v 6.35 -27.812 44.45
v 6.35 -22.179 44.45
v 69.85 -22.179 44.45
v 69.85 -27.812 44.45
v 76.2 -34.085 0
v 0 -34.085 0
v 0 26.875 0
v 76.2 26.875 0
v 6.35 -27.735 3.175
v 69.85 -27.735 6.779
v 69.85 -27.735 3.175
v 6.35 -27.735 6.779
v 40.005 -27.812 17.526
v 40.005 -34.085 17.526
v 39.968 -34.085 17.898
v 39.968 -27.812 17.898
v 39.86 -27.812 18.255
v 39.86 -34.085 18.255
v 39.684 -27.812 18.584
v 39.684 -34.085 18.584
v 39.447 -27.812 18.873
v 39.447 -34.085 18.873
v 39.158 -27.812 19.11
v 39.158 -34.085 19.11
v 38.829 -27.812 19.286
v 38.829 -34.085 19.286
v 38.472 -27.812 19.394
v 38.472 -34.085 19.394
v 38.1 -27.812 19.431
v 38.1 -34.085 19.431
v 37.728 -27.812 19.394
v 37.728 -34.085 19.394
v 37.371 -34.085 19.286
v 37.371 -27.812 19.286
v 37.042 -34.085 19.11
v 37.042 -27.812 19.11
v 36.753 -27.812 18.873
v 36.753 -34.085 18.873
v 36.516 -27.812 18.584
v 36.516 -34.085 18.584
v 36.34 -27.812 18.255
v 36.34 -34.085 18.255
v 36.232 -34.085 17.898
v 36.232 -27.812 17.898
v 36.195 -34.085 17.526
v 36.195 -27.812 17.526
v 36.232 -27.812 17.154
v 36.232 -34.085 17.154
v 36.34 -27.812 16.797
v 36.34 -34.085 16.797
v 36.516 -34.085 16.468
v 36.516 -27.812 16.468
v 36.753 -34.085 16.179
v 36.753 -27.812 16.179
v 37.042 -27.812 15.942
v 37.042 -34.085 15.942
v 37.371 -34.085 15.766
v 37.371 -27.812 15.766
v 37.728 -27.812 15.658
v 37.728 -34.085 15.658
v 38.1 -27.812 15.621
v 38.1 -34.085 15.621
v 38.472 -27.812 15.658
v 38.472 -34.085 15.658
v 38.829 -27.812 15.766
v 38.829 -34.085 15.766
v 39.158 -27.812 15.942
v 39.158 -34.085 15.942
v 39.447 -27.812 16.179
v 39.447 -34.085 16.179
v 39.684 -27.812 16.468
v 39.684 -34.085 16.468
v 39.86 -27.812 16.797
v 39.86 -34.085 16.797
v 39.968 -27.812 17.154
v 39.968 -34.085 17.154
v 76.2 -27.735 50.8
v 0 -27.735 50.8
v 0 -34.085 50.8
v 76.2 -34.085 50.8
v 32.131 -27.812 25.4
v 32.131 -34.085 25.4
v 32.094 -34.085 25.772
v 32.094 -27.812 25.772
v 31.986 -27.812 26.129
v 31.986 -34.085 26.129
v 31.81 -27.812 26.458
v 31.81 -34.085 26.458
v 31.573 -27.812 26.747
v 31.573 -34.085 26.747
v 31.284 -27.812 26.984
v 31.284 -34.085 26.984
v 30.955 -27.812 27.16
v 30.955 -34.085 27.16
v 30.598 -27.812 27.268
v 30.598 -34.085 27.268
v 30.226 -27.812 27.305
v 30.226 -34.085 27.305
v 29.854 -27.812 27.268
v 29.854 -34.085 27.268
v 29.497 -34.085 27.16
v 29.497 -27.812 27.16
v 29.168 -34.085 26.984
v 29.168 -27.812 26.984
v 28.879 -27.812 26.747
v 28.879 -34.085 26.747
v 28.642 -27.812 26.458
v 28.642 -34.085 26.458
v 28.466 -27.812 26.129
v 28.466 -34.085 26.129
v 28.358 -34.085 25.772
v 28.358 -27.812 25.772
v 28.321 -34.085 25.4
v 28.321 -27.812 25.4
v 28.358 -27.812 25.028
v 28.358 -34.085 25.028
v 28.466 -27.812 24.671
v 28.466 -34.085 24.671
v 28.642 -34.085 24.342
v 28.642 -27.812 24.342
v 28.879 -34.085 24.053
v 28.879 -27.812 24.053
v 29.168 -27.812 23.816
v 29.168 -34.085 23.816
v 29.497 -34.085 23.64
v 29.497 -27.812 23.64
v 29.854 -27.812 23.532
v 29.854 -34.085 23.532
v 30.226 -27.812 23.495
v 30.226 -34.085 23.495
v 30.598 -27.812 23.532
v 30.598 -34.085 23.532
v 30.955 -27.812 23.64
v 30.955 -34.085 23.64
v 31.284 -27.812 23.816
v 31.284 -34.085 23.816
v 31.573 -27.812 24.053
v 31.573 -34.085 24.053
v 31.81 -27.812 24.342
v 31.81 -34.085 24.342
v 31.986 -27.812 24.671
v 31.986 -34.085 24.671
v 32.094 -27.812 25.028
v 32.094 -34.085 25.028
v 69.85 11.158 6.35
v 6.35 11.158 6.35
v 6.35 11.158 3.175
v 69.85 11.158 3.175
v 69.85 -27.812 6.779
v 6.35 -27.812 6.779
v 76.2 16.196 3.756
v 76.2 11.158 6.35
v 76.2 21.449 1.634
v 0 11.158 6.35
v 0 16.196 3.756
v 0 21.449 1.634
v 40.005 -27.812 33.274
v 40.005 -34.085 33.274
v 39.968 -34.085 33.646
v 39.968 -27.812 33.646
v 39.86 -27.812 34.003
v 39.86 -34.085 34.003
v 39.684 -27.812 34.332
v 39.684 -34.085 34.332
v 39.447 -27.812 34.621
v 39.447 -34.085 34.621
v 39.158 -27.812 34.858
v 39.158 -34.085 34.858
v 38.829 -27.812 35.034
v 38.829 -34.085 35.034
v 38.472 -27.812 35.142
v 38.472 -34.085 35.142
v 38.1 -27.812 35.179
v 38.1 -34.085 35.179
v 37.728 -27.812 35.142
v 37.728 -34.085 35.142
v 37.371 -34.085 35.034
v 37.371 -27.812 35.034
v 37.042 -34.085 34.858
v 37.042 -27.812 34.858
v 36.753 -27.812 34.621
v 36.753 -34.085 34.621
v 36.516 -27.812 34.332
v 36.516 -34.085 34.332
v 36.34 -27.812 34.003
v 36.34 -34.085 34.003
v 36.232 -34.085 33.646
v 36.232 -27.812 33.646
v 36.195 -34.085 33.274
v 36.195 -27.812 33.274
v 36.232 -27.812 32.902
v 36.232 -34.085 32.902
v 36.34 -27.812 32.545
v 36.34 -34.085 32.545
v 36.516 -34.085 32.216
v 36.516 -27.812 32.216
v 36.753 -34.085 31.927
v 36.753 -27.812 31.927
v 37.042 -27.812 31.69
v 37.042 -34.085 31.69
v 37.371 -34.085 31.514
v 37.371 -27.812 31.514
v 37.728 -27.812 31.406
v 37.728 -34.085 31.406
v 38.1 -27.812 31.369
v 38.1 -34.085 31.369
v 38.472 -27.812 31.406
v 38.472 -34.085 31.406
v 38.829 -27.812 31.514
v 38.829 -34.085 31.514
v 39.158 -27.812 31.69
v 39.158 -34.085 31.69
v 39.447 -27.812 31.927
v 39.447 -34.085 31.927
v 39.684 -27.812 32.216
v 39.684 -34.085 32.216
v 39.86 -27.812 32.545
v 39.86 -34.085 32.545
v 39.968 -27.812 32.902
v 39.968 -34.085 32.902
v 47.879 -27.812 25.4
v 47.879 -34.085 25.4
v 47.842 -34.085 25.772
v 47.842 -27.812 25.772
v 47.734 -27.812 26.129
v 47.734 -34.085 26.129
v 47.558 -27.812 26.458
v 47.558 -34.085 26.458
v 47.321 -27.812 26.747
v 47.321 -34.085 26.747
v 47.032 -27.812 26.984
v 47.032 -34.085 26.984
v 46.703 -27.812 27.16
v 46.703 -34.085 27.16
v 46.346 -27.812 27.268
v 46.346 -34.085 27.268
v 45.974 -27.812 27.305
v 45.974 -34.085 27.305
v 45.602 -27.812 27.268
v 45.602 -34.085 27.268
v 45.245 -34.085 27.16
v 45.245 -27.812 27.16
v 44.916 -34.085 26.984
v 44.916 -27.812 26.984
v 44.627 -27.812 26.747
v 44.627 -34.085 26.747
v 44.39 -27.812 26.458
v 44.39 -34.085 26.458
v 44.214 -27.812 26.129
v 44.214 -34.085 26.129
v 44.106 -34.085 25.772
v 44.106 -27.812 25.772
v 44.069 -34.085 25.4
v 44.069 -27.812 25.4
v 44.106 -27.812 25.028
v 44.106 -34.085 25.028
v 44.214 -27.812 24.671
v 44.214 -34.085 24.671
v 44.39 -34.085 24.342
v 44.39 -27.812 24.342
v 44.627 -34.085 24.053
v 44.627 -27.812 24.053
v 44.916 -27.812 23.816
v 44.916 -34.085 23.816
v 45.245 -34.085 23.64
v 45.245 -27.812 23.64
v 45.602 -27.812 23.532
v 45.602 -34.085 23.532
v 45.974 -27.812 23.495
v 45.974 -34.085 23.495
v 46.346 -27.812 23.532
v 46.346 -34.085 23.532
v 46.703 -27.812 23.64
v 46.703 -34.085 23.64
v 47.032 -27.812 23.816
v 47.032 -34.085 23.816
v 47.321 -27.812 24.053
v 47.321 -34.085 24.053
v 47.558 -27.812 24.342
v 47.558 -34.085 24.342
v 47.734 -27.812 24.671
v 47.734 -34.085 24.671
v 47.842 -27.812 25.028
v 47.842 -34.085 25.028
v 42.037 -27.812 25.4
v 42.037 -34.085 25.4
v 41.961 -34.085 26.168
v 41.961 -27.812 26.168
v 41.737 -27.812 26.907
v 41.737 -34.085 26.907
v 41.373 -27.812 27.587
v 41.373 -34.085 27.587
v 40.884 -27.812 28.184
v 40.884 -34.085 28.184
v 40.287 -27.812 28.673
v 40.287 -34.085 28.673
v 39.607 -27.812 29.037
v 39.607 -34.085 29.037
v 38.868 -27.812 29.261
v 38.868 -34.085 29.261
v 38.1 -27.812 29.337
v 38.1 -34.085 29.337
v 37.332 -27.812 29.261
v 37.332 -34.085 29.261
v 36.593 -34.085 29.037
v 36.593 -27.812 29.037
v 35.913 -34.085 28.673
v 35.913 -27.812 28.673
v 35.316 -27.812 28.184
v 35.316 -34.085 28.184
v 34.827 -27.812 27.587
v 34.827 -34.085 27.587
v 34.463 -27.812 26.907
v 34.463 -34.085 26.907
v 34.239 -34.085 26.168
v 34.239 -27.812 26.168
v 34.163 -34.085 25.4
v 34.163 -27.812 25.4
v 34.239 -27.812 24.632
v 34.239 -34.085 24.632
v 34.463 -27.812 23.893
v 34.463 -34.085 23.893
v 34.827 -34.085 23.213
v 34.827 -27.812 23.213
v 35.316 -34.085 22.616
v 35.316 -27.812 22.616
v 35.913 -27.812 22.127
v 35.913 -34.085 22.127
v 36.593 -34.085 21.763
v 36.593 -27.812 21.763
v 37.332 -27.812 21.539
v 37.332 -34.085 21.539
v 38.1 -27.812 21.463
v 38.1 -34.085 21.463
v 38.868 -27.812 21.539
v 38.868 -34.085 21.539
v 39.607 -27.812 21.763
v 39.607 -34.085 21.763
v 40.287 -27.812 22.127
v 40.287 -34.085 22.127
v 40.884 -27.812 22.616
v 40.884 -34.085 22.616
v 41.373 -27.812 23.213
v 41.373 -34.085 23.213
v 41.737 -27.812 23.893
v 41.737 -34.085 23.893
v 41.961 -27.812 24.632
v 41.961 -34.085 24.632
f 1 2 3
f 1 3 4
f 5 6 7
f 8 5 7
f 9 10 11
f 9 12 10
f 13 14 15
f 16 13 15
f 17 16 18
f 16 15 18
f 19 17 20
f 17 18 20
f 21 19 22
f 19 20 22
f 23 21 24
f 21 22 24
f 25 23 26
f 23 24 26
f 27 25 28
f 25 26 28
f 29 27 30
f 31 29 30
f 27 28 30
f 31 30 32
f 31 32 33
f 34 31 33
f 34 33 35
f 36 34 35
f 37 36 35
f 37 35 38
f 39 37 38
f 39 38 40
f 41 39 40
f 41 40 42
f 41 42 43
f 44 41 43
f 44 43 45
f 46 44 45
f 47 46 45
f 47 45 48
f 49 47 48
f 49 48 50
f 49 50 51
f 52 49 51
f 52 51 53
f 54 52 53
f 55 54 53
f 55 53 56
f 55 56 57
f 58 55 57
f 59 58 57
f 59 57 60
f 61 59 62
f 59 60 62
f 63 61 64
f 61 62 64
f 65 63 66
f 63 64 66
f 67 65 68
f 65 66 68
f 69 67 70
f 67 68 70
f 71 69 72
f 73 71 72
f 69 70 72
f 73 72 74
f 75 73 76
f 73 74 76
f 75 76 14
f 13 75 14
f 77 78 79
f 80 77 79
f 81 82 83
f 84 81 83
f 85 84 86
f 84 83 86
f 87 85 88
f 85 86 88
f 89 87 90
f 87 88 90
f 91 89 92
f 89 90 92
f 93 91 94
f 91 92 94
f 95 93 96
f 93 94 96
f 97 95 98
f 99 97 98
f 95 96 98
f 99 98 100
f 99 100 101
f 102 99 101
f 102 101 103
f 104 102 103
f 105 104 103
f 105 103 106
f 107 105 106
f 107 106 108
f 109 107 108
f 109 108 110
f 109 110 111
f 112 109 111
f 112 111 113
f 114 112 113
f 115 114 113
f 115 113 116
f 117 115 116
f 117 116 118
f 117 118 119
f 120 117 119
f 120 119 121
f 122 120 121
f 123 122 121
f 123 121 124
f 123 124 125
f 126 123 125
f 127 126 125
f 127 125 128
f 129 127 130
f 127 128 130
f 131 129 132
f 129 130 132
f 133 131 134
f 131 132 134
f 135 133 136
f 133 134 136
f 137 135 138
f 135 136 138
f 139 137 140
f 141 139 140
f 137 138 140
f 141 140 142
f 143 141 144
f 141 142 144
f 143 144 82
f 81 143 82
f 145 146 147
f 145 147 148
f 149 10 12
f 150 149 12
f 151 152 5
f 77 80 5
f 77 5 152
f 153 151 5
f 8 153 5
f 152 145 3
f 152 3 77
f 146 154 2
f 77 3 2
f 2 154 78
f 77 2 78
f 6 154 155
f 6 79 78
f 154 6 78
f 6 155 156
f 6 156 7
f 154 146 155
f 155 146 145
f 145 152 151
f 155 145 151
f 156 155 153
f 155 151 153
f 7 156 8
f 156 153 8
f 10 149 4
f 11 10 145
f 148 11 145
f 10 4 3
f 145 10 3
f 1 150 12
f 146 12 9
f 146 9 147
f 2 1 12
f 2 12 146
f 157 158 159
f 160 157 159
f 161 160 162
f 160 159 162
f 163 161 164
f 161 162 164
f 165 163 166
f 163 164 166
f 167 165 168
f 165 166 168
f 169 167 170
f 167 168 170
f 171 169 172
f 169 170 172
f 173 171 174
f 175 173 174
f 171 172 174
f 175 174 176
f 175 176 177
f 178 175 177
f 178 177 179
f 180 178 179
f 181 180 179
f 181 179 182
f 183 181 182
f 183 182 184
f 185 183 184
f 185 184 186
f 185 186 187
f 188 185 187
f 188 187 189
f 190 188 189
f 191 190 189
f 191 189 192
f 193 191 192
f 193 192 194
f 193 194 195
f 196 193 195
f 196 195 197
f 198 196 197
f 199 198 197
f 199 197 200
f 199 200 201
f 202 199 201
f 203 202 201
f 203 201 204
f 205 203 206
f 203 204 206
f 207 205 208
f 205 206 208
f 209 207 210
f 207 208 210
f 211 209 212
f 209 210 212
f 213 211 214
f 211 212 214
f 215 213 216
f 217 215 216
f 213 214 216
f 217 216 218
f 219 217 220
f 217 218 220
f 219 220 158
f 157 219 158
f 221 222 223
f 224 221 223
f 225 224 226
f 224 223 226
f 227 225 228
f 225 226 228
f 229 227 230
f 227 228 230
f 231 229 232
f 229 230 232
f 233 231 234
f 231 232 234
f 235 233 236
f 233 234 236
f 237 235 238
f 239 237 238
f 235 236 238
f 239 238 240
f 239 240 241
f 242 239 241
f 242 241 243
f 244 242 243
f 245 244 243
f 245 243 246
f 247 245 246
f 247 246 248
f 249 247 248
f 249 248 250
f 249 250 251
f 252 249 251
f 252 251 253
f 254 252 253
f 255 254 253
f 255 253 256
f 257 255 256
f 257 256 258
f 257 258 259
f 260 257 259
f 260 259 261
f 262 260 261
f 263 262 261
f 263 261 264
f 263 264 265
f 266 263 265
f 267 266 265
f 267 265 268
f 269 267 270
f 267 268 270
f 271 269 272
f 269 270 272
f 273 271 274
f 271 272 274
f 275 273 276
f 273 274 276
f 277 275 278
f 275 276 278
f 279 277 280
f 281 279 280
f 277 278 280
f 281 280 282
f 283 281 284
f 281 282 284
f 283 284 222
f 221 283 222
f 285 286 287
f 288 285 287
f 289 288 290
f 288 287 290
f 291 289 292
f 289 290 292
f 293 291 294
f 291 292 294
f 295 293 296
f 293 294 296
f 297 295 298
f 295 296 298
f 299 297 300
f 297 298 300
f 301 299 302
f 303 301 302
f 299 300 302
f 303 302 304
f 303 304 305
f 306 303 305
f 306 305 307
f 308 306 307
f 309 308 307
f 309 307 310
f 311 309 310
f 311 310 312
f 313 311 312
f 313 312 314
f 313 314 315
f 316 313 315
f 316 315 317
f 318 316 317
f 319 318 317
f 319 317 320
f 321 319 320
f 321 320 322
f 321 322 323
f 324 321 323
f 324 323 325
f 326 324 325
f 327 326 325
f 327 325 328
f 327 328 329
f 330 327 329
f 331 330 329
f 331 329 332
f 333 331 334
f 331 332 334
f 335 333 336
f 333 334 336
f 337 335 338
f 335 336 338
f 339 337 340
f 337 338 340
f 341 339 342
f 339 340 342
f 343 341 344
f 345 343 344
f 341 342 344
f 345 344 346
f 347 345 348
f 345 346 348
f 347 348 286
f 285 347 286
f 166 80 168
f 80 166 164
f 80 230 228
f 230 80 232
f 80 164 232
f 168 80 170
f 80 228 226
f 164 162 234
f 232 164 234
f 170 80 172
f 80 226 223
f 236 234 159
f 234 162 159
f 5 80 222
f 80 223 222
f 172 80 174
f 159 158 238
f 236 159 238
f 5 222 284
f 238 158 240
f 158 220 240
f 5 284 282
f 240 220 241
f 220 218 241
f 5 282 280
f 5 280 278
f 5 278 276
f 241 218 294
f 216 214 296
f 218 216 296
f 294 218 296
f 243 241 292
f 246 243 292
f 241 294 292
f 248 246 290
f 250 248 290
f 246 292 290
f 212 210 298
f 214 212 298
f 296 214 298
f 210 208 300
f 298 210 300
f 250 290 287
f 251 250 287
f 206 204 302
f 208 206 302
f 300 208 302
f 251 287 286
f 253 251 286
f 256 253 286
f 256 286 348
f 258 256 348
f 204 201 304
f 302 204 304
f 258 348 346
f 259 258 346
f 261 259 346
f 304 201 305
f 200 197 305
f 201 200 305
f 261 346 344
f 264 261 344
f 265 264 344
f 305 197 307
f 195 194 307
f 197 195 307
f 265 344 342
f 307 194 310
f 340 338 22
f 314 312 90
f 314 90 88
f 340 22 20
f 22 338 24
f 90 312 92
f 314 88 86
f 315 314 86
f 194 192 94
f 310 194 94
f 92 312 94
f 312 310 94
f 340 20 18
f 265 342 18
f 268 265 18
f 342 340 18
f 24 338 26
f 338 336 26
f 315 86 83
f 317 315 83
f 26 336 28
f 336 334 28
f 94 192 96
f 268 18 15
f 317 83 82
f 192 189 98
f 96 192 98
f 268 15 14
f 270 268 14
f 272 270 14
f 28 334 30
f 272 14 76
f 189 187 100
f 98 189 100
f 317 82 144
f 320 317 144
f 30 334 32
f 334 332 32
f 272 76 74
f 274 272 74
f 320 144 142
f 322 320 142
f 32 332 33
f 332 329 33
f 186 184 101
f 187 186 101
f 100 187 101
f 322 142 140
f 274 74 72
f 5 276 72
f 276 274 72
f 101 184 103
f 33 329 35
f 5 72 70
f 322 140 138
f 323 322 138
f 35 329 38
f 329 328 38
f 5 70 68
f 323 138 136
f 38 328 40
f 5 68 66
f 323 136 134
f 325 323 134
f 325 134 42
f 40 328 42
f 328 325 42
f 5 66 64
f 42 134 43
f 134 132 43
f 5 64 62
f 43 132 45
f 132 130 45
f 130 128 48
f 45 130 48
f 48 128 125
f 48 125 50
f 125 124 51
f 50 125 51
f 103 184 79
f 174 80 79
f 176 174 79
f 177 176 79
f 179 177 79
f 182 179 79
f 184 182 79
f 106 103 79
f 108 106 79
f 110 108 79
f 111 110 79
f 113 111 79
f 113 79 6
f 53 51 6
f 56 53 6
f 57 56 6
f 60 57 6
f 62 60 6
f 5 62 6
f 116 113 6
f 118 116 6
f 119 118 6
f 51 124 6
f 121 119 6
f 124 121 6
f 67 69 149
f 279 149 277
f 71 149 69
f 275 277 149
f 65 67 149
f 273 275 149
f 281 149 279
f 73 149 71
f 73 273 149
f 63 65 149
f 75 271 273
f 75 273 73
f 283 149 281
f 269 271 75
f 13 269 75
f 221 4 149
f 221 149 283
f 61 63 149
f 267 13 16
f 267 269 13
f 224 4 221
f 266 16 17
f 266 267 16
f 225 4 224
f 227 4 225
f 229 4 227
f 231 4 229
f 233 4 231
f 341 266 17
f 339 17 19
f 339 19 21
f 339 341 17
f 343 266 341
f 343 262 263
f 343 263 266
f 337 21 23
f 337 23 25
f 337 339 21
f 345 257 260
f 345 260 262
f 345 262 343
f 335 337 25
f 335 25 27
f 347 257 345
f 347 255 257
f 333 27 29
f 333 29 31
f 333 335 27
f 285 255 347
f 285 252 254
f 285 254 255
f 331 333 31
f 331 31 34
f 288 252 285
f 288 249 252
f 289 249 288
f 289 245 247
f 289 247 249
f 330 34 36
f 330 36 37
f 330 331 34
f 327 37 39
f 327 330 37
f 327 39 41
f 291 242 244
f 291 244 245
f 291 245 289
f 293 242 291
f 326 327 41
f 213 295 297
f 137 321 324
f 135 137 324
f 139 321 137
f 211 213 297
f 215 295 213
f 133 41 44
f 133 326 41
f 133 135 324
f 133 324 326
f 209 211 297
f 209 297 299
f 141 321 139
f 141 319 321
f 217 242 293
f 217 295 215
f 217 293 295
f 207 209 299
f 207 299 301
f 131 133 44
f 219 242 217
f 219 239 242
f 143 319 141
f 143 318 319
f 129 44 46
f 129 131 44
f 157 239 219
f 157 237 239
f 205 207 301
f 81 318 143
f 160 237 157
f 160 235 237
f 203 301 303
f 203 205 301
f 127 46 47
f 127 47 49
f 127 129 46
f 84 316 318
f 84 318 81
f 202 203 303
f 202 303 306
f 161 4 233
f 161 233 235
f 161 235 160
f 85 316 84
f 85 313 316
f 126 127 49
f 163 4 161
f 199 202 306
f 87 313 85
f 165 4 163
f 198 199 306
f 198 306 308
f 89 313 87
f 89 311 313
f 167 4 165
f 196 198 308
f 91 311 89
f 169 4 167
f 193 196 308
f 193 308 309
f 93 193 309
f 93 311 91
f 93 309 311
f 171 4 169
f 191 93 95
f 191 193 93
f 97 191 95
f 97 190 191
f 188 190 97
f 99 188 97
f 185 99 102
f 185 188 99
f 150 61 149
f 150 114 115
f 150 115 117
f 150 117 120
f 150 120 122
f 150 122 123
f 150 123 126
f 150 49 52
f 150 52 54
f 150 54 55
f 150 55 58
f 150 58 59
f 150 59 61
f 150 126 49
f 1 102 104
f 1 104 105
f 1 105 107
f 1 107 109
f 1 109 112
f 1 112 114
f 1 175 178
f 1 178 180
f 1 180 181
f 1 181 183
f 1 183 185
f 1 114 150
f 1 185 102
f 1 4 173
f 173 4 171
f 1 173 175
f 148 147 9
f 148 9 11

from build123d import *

# Parameters (mm, degrees)
F1_DEPTH  = 76.2
F2_T      = -6.35
F3_W      = 76.2
F3_H      = 50.8
F3_H_2    = 10.16
F4_DEPTH  = 6.35
F6_DEPTH  = 76.2
F7_R      = 3.937
F7_R_2    = 1.905
F8_DEPTH  = 25.4
F9_W      = 63.5
F9_H      = 38.89375
F10_DEPTH = 3.175
F11_W     = 63.5
F11_H     = 37.67111
F12_DEPTH = 0.0762


with BuildPart() as f1:
    # F0 (on Right) → F1 (new body)
    with BuildSketch(Plane.YZ):
        Polygon((-34.085404, 0), (0, 0), (16.714596, 0), (-27.735404, 50.8), (-34.085404, 50.8), align=None)
    extrude(amount=F1_DEPTH)

    # F2
    f2_openings = [f1.faces().sort_by_distance(p)[0] for p in [
        (38.1, -5.510404, 25.4),
    ]]
    offset(amount=F2_T, openings=f2_openings)

    # F3 (on face) → F4 (join)
    with BuildSketch(Plane(origin=(0, 0, 0), x_dir=(1, 0, 0), z_dir=(0, 0, -1))):
        with Locations((38.1, 8.685404)):
            Rectangle(F3_W, F3_H)
        with Locations((38.1, -21.794596)):
            Rectangle(F3_W, F3_H_2)
    extrude(amount=-F4_DEPTH)

    # F5 (on face) → F6 (cut)
    with BuildSketch(Plane.YZ.offset(76.2)):
        with BuildLine():
            Line((26.874596, 6.35), (11.158346, 6.35))
            ThreePointArc((11.158346, 6.35), (18.798291, 2.635004), (26.874596, 0))
            Line((26.874596, 0), (26.874596, 6.35))
        make_face()
    extrude(amount=-F6_DEPTH, mode=Mode.SUBTRACT)

    # F7 (on face) → F8 (cut)
    with BuildSketch(Plane.XZ.offset(34.085404)):
        with Locations((38.1, 25.4)):
            Circle(F7_R)
        with Locations((38.1, 33.274)):
            Circle(F7_R_2)
        with Locations((38.1, 17.526)):
            Circle(F7_R_2)
        with Locations((30.226, 25.4)):
            Circle(F7_R_2)
        with Locations((45.974, 25.4)):
            Circle(F7_R_2)
    extrude(amount=-F8_DEPTH, mode=Mode.SUBTRACT)

    # F9 (on face) → F10 (cut)
    with BuildSketch(Plane.XY.offset(6.35)):
        with Locations((38.1, -8.288529)):
            Rectangle(F9_W, F9_H)
    extrude(amount=-F10_DEPTH, mode=Mode.SUBTRACT)

    # F11 (on face) → F12 (cut)
    with BuildSketch(Plane(origin=(0, -27.735404, 0), x_dir=(-1, 0, 0), z_dir=(0, 1, 0))):
        with Locations((-38.1, 25.614445)):
            Rectangle(F11_W, F11_H)
    extrude(amount=-F12_DEPTH, mode=Mode.SUBTRACT)


solid = f1.part
